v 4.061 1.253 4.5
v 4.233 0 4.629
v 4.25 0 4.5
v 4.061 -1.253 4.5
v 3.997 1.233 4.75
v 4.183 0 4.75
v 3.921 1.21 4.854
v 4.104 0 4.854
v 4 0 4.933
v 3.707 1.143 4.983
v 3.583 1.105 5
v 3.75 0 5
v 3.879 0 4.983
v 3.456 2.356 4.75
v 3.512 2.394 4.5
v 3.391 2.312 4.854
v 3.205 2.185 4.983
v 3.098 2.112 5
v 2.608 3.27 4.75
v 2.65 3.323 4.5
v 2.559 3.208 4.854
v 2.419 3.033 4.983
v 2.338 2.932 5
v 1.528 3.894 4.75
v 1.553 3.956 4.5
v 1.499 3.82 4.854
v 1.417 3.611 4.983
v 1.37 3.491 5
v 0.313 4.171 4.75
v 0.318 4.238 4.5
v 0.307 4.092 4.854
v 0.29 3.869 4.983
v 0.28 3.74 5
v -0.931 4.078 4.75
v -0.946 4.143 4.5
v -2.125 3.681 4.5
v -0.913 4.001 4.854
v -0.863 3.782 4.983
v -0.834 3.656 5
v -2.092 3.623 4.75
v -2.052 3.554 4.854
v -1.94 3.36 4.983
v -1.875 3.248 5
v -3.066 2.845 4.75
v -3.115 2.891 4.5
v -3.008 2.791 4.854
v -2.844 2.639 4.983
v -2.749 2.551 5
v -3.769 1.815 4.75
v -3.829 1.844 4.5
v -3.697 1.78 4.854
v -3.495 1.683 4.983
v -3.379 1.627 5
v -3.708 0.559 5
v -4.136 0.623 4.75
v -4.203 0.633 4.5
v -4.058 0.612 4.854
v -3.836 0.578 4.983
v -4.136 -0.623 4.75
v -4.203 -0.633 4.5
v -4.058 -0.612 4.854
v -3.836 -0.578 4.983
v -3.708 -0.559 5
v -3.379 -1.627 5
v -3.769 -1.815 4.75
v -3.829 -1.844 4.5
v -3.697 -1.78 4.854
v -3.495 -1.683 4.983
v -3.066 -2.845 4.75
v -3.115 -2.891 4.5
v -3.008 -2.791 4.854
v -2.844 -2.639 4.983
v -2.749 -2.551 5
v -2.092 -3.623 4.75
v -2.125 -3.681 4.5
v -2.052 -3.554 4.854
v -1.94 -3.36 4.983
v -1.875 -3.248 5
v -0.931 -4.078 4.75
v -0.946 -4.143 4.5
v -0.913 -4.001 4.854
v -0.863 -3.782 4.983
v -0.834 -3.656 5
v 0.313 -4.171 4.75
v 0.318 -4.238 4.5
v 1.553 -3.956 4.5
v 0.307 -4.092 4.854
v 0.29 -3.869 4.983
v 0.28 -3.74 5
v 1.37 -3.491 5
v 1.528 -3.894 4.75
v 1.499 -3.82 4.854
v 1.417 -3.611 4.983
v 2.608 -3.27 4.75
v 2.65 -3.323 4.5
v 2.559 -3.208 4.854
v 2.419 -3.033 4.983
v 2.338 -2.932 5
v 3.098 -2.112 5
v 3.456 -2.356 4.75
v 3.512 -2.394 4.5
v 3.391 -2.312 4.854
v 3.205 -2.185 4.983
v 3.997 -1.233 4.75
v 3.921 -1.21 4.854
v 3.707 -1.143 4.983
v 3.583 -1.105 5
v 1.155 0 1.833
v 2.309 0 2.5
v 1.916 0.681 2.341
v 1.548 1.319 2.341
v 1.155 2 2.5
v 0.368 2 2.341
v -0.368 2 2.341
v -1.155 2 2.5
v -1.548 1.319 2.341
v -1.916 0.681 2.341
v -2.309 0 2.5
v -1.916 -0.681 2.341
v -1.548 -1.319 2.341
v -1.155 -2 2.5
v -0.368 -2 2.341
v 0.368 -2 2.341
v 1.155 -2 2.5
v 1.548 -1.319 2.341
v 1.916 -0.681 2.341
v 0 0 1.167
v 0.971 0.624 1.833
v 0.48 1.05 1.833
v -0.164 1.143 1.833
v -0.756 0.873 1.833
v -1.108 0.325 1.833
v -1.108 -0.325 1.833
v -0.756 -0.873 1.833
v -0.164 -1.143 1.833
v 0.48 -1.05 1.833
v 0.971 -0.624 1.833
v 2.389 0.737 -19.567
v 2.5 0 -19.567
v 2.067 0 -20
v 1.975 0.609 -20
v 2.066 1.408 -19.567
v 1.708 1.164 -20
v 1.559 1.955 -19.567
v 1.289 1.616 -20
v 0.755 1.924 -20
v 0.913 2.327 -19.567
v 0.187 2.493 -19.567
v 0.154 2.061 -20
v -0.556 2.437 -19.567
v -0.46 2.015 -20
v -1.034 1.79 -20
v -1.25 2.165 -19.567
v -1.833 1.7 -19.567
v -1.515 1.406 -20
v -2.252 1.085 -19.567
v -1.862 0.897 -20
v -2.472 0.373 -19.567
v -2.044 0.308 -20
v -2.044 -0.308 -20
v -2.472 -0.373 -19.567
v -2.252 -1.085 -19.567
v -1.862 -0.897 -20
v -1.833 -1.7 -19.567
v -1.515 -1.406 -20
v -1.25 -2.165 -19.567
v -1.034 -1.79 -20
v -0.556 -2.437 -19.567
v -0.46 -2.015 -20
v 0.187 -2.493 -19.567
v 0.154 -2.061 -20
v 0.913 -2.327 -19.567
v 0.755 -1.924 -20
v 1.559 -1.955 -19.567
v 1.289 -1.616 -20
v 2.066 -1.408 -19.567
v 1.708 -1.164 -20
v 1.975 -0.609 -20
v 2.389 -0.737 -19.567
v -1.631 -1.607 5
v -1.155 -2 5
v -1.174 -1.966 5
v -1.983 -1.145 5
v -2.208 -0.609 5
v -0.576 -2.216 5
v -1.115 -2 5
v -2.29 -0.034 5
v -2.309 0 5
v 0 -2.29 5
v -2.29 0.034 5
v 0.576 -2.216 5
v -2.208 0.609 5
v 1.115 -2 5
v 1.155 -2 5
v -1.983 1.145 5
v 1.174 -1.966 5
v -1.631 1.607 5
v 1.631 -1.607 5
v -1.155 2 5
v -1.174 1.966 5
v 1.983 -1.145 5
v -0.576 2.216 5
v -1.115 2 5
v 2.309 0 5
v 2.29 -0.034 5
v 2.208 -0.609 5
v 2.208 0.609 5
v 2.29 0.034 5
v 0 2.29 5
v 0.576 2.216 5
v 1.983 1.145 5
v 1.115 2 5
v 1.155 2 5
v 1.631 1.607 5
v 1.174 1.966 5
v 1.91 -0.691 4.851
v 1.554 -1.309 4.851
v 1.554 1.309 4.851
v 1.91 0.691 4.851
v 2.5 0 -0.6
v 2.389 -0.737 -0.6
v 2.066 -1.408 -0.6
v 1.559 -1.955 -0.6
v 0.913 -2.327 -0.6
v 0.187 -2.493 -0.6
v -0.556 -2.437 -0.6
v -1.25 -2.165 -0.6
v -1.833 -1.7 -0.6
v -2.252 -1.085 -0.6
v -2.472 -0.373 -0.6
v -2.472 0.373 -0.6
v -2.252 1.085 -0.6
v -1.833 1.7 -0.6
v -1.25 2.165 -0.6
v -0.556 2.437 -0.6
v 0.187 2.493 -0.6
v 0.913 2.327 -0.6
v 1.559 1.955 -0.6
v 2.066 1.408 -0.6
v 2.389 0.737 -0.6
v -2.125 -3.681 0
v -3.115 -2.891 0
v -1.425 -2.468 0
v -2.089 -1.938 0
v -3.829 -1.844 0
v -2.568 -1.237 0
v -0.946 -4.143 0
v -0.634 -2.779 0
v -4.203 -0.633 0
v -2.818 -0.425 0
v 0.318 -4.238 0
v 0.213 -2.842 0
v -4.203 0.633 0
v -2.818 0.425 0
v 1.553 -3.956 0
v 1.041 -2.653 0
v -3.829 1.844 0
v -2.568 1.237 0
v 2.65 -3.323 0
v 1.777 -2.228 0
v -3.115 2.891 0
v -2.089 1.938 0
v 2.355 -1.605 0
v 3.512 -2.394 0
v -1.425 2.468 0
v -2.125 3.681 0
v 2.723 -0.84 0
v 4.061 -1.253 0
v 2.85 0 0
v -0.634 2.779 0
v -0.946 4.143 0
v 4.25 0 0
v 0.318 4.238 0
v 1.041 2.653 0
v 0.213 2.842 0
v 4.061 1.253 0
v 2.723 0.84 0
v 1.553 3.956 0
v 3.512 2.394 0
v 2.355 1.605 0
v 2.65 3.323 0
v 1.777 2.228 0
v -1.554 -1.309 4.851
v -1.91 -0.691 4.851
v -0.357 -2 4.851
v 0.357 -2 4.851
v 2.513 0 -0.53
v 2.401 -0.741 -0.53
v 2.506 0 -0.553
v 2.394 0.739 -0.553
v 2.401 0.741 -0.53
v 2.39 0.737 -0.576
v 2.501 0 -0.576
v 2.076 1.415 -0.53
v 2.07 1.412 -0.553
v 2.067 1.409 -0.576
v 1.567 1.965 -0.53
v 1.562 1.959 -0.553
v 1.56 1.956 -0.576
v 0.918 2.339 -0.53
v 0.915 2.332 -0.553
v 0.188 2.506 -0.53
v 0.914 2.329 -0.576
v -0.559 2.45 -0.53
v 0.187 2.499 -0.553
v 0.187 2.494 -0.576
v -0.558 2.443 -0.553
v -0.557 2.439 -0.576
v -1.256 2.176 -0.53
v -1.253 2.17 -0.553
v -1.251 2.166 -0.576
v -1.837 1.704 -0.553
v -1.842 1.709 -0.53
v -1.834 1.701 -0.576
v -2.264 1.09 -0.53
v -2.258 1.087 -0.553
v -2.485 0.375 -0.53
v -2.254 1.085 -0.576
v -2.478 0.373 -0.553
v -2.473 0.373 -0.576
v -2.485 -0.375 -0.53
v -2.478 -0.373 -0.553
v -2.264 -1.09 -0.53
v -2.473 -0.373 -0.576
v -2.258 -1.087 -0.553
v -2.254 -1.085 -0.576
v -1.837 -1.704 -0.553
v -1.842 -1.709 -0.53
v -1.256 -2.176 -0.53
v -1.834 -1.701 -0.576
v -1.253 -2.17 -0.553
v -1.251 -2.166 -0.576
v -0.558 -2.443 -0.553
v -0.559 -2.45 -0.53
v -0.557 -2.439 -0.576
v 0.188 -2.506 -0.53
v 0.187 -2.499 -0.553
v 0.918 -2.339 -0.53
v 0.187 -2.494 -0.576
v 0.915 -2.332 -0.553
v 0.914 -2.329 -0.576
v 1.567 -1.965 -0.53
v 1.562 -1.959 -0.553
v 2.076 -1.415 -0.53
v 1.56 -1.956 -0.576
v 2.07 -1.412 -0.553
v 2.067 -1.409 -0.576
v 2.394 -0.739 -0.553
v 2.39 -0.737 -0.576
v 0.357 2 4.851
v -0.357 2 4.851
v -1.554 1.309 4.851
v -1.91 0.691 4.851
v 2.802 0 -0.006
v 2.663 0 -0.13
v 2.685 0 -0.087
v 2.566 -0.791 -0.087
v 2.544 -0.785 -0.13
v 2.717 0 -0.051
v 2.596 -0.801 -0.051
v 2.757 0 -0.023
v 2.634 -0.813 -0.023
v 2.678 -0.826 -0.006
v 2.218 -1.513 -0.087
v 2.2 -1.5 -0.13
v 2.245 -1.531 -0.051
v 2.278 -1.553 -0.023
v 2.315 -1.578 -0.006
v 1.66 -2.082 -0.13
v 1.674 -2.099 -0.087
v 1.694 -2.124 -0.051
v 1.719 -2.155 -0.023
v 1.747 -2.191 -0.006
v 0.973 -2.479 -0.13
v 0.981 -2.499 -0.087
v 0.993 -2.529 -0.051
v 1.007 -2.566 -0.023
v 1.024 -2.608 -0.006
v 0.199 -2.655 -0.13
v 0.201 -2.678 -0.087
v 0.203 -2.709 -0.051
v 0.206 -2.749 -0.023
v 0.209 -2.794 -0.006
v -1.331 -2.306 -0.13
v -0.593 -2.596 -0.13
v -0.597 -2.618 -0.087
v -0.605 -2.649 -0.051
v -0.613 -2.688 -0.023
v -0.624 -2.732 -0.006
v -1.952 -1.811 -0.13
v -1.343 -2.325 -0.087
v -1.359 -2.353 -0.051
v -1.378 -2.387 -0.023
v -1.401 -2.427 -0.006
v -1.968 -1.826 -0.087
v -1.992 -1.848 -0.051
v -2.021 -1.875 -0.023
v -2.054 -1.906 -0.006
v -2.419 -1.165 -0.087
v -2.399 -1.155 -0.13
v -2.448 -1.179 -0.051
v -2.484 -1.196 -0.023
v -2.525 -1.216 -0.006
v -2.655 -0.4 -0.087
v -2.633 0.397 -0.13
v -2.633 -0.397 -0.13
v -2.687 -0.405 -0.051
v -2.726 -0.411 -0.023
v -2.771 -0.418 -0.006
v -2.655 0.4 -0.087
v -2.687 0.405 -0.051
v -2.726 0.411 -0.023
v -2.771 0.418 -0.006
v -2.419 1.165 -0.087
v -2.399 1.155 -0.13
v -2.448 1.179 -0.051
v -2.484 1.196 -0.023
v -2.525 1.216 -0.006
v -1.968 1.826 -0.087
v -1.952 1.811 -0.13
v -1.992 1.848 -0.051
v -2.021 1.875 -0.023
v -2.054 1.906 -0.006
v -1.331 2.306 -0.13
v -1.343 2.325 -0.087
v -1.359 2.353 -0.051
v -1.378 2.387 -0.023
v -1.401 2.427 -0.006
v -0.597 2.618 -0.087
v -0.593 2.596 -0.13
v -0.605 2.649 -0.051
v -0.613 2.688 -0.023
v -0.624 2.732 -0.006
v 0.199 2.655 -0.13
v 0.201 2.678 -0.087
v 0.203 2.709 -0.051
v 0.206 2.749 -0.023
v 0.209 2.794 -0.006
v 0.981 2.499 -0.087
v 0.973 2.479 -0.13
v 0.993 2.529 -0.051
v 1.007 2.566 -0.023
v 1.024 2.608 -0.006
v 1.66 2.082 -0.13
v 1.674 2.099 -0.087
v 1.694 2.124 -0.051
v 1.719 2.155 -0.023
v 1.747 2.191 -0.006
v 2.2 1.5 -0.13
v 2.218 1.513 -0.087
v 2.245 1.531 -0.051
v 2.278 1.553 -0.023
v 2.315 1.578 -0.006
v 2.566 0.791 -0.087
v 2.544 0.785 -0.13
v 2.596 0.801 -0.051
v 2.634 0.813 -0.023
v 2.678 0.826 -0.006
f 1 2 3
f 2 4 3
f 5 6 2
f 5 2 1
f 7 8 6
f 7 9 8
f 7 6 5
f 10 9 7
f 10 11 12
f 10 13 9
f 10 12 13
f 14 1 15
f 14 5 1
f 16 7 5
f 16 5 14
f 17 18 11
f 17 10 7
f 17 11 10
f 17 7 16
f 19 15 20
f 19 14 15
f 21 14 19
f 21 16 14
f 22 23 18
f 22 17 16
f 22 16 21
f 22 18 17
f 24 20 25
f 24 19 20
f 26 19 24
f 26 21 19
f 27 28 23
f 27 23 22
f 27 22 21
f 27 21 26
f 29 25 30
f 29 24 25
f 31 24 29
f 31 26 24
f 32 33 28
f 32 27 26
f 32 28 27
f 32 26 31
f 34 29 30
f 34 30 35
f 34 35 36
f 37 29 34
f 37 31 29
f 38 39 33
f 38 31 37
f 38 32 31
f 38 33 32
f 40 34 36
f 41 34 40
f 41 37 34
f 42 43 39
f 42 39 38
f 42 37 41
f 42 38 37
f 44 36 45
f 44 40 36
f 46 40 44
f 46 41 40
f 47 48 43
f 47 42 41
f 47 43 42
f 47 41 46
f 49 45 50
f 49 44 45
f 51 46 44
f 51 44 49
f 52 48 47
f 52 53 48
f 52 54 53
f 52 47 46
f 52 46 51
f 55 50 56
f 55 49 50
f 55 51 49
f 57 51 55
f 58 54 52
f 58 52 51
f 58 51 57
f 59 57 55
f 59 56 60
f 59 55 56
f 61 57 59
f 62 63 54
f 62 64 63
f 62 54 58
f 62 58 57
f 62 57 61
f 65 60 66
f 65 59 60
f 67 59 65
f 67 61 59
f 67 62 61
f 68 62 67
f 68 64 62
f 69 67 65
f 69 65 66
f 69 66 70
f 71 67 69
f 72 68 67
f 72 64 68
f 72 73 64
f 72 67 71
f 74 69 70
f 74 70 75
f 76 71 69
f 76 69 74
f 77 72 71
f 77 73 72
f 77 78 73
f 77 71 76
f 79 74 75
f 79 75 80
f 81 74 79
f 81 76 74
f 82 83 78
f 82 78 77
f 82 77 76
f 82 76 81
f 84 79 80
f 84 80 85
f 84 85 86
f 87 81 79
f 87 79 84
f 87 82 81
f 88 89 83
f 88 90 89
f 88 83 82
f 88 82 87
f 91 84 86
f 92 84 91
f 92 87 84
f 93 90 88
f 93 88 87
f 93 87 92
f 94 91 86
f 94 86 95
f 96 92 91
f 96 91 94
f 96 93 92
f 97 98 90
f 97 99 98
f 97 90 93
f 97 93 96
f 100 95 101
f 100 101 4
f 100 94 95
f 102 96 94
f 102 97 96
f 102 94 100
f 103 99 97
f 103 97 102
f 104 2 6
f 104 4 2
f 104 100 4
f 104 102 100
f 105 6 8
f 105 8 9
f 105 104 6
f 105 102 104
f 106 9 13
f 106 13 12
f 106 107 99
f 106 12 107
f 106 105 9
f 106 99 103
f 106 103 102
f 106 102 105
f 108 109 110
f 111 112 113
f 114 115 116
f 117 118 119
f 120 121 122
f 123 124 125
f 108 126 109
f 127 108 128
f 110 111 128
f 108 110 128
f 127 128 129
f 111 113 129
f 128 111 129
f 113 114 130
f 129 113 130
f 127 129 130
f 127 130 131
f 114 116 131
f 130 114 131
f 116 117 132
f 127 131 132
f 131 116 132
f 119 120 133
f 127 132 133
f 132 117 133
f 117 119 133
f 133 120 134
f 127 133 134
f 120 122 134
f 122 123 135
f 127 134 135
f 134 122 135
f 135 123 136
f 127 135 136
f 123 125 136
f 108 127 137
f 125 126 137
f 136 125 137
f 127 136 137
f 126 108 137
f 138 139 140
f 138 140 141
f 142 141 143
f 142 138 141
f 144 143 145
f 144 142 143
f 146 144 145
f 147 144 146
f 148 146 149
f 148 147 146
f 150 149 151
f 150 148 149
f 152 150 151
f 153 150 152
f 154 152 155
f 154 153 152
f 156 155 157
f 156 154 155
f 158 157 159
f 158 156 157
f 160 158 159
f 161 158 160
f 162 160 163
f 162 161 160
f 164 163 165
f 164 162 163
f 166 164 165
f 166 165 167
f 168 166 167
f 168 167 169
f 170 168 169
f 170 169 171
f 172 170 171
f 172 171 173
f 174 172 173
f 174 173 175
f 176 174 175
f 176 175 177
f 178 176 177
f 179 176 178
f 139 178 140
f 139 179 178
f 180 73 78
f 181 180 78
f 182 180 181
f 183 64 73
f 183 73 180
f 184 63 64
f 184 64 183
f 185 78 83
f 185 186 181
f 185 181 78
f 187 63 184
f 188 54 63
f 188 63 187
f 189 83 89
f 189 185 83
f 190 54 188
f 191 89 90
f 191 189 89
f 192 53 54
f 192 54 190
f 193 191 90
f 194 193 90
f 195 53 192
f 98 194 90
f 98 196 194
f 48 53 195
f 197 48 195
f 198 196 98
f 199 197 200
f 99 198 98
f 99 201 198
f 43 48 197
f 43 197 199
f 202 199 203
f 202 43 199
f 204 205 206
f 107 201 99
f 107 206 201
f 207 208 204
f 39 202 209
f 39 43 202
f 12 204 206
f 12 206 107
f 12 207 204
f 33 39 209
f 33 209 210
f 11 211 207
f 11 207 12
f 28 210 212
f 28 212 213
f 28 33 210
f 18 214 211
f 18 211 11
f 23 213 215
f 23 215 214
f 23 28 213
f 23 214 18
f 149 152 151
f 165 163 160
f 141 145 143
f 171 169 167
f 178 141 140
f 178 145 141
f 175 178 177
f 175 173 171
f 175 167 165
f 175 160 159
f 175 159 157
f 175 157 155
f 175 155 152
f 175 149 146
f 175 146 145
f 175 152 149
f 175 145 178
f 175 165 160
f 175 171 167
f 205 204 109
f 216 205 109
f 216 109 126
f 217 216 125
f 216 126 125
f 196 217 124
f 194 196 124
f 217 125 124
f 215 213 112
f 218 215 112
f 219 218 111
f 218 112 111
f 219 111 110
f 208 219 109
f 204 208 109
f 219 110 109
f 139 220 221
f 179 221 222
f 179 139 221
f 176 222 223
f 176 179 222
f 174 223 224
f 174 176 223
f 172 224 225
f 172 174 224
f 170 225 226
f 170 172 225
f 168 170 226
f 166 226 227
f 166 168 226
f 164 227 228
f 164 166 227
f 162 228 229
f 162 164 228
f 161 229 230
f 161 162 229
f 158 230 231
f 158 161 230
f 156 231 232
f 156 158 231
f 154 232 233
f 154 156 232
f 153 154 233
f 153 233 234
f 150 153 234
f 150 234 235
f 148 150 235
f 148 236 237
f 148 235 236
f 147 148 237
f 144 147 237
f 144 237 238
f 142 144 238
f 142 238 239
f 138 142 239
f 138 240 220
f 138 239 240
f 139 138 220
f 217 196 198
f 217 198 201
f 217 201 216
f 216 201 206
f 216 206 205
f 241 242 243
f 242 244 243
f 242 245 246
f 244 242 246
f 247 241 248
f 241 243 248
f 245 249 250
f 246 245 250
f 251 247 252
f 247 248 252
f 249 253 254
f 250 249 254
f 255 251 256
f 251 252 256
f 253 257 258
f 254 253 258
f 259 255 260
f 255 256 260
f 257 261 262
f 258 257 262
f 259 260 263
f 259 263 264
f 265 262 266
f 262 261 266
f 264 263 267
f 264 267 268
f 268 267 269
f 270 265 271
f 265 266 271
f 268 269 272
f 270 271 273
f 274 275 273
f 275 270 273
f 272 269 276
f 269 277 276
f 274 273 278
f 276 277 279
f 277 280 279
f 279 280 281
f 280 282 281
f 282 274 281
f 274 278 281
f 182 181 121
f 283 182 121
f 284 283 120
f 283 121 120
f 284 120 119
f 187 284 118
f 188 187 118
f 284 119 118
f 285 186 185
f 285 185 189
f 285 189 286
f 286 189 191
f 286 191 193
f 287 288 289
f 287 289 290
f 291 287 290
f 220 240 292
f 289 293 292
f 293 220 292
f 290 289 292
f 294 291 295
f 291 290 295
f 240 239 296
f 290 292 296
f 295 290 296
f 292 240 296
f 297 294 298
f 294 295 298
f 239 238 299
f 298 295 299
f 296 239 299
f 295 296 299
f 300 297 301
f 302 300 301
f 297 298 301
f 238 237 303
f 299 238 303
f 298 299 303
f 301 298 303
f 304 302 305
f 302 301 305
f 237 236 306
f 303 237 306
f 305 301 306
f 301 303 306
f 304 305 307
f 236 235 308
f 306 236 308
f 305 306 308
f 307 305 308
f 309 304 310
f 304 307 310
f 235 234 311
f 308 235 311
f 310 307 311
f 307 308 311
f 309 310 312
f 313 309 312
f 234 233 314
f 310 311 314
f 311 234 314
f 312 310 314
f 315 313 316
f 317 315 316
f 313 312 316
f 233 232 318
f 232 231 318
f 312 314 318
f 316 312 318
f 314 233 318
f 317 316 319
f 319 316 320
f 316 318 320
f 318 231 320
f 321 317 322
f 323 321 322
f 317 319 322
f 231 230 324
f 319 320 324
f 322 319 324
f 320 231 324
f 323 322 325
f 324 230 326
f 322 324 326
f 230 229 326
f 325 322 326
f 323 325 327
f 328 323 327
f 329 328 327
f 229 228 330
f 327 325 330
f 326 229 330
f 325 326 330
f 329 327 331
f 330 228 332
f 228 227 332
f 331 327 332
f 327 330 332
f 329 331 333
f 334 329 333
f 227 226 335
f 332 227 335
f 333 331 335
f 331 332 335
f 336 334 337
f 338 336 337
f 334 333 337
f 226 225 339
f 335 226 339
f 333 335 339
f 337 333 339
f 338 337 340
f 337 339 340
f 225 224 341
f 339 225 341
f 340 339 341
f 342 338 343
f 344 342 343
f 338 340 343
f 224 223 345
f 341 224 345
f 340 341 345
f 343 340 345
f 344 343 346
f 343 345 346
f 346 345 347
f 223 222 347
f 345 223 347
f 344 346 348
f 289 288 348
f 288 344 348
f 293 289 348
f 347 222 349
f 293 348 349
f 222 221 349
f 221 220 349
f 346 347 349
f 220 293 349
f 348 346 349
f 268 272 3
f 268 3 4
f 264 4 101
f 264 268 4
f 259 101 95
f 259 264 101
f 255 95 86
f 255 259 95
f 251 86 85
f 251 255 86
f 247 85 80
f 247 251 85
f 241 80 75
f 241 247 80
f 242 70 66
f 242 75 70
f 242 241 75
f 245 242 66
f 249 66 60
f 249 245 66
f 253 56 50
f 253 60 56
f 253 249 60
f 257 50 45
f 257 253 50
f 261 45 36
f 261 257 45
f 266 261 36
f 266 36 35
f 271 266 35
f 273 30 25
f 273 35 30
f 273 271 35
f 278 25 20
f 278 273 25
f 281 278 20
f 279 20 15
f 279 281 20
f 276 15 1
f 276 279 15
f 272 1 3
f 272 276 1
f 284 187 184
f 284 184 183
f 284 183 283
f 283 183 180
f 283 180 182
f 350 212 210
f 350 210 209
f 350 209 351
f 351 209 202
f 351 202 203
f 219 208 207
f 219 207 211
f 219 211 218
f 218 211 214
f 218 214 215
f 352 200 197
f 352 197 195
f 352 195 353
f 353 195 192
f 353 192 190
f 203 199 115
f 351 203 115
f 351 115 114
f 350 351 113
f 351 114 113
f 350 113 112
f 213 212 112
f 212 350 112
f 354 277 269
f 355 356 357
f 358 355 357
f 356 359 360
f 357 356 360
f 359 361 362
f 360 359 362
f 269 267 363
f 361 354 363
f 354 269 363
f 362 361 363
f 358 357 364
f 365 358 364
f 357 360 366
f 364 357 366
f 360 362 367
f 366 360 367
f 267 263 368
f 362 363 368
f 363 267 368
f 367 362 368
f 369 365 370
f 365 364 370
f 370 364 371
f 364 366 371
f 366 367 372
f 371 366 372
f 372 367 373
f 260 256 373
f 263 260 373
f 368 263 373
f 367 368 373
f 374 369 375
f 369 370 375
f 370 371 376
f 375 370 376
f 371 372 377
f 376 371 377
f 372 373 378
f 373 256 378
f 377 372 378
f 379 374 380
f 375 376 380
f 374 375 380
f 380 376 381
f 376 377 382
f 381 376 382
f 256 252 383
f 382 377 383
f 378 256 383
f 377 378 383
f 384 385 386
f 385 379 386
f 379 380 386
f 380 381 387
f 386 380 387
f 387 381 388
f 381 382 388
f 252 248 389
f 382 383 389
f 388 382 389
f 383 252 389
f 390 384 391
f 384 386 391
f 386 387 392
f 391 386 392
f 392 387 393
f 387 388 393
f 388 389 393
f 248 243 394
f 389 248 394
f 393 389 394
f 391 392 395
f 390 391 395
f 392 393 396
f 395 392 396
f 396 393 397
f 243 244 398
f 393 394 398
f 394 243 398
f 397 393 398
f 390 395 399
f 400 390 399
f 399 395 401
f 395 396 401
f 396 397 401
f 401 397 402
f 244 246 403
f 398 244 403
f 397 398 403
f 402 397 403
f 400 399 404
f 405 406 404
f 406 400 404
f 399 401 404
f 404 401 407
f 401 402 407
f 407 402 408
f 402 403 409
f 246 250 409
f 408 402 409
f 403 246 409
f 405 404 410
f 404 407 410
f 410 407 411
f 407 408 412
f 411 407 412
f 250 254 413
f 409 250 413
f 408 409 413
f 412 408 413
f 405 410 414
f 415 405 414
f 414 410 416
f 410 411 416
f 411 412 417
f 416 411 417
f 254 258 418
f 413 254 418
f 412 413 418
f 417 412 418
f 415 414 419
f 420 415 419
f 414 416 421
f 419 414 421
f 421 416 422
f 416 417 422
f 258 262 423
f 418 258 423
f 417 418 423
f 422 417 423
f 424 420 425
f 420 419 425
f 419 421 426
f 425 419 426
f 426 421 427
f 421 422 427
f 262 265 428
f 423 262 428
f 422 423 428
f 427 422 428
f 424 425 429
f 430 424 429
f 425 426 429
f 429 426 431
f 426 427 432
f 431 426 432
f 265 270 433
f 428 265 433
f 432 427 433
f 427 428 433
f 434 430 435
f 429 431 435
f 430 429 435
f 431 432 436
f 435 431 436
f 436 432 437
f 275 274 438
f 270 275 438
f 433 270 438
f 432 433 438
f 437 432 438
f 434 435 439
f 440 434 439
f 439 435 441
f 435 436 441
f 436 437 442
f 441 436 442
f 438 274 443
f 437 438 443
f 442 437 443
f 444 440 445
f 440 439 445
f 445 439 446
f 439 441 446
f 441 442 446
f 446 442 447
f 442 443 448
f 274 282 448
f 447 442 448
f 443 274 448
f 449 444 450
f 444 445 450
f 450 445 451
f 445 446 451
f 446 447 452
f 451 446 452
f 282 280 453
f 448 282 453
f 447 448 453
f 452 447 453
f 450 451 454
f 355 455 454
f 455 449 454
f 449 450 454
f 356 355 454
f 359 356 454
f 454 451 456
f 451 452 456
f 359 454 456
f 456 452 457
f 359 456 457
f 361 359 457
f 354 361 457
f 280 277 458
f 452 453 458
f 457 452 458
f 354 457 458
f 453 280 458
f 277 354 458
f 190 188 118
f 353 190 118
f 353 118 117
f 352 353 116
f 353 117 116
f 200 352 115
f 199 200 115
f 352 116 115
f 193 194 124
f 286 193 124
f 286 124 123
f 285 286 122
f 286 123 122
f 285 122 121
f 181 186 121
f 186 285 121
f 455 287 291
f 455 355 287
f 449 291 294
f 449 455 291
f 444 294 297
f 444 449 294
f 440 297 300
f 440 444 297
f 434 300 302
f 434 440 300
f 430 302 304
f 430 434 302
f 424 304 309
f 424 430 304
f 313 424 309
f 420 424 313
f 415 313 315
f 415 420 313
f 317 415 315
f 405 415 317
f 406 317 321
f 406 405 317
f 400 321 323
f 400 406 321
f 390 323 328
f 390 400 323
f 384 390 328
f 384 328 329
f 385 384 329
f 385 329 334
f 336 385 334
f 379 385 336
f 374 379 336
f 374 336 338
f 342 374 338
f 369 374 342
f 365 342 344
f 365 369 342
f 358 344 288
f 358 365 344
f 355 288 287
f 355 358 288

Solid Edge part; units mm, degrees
sketch "Sketch1" plane through (0, 0, 0) normal (0, 0, 1) x (1, 0, 0)
  line L0 (-1.1547, 2) -> (1.1547, 2)
  line L1 (1.1547, 2) -> (2.3094, 0)
  line L2 (2.3094, 0) -> (1.1547, -2)
  line L3 (1.1547, -2) -> (-1.1547, -2)
  line L4 (-1.1547, -2) -> (-2.3094, 0)
  line L5 (-2.3094, 0) -> (-1.1547, 2)
  circle A0 centre (0, 0) radius 4.25
  dimension "D1" = 8.5
  dimension "D2" = 4
extrude "Protrusion1" add sketch "Sketch1" along normal blind 5
sketch "Sketch2" plane through (0, 0, 0) normal (0, -1, 0) x (1, 0, 0)
  line L0 (0, 1.1667) -> (2.3094, 2.5)
  line L1 (2.3094, 2.5) -> (4.25, 2.5)
  line L2 (4.25, 2.5) -> (4.25, 0)
  line L3 (4.25, 0) -> (2.5, 0)
  line L4 (2.5, 0) -> (2.5, -0.6)
  line L5 (2.5, -0.6) -> (2.5, -0.601) construction
  line L6 (2.5, -0.601) -> (2.5, -0.601) construction
  line L7 (2.5, -0.601) -> (2.5, -20)
  line L8 (0, -20) -> (2.5, -20)
  dimension "D1" = 19.399
  dimension "D2" = 2.5
  dimension "D3" = 2.5
  dimension "D4" = 4.25
  dimension "D5" = 2.5
  dimension "D6" = 22.5
  dimension "D7" = 0.001
  dimension "D8" = 2
  dimension "D9" = 2
revolve "RevolvedProtrusion_1" add sketch "Sketch2" angle 360 about axis through (0, 0, 2.3333) along (0, 0, -1)
cosmetic_thread "Thread_1" size "M5" thread depth 19.398
sketch "Sketch3" plane through (0, 0, 0) normal (0, -1, 0) x (1, 0, 0)
  line L0 (0, 6) -> (2.29, 6)
  line L1 (2.29, 6) -> (2.29, 5)
  line L2 (2.29, 5) -> (0, 3.6779)
  dimension "D1" = 2.29
  dimension "D2" = 1
  dimension "D3" = 6
revolve "RevolvedCutout_1" cut sketch "Sketch3" angle 360 about axis through (0, 0, 7.1999) along (0, 0, 1)
fillet "Round_1" radius 0.5 1 edges at (-4.25, 0, 5)
sketch "Sketch4" plane through (0, 0, 0) normal (0, -1, 0) x (1, 0, 0)
  line L0 (2.5, 0) -> (2.85, 0)
  arc A0 (2.6627, -0.1298) -> (2.85, 0) centre (2.85, -0.2) cw
  line L1 (2.5127, -0.5298) -> (2.6627, -0.1298)
  arc A1 (2.5127, -0.5298) -> (2.5, -0.6) centre (2.7, -0.6) ccw
  line L2 (2.5, 0) -> (2.5, -0.6)
  dimension "D1" = 0.6
  dimension "D2" = 2.5
  dimension "D3" = 0.6
  dimension "D4" = 0.35
  dimension "D5" = 0.2
revolve "RevolvedProtrusion_2" add sketch "Sketch4" angle 360 about axis through (0, 0, -1.02) along (0, 0, 1)
chamfer "Chamfer_1" distance 0.433 angle 45 1 edges at (-2.5, 0, -20)
properties material "Steel"
